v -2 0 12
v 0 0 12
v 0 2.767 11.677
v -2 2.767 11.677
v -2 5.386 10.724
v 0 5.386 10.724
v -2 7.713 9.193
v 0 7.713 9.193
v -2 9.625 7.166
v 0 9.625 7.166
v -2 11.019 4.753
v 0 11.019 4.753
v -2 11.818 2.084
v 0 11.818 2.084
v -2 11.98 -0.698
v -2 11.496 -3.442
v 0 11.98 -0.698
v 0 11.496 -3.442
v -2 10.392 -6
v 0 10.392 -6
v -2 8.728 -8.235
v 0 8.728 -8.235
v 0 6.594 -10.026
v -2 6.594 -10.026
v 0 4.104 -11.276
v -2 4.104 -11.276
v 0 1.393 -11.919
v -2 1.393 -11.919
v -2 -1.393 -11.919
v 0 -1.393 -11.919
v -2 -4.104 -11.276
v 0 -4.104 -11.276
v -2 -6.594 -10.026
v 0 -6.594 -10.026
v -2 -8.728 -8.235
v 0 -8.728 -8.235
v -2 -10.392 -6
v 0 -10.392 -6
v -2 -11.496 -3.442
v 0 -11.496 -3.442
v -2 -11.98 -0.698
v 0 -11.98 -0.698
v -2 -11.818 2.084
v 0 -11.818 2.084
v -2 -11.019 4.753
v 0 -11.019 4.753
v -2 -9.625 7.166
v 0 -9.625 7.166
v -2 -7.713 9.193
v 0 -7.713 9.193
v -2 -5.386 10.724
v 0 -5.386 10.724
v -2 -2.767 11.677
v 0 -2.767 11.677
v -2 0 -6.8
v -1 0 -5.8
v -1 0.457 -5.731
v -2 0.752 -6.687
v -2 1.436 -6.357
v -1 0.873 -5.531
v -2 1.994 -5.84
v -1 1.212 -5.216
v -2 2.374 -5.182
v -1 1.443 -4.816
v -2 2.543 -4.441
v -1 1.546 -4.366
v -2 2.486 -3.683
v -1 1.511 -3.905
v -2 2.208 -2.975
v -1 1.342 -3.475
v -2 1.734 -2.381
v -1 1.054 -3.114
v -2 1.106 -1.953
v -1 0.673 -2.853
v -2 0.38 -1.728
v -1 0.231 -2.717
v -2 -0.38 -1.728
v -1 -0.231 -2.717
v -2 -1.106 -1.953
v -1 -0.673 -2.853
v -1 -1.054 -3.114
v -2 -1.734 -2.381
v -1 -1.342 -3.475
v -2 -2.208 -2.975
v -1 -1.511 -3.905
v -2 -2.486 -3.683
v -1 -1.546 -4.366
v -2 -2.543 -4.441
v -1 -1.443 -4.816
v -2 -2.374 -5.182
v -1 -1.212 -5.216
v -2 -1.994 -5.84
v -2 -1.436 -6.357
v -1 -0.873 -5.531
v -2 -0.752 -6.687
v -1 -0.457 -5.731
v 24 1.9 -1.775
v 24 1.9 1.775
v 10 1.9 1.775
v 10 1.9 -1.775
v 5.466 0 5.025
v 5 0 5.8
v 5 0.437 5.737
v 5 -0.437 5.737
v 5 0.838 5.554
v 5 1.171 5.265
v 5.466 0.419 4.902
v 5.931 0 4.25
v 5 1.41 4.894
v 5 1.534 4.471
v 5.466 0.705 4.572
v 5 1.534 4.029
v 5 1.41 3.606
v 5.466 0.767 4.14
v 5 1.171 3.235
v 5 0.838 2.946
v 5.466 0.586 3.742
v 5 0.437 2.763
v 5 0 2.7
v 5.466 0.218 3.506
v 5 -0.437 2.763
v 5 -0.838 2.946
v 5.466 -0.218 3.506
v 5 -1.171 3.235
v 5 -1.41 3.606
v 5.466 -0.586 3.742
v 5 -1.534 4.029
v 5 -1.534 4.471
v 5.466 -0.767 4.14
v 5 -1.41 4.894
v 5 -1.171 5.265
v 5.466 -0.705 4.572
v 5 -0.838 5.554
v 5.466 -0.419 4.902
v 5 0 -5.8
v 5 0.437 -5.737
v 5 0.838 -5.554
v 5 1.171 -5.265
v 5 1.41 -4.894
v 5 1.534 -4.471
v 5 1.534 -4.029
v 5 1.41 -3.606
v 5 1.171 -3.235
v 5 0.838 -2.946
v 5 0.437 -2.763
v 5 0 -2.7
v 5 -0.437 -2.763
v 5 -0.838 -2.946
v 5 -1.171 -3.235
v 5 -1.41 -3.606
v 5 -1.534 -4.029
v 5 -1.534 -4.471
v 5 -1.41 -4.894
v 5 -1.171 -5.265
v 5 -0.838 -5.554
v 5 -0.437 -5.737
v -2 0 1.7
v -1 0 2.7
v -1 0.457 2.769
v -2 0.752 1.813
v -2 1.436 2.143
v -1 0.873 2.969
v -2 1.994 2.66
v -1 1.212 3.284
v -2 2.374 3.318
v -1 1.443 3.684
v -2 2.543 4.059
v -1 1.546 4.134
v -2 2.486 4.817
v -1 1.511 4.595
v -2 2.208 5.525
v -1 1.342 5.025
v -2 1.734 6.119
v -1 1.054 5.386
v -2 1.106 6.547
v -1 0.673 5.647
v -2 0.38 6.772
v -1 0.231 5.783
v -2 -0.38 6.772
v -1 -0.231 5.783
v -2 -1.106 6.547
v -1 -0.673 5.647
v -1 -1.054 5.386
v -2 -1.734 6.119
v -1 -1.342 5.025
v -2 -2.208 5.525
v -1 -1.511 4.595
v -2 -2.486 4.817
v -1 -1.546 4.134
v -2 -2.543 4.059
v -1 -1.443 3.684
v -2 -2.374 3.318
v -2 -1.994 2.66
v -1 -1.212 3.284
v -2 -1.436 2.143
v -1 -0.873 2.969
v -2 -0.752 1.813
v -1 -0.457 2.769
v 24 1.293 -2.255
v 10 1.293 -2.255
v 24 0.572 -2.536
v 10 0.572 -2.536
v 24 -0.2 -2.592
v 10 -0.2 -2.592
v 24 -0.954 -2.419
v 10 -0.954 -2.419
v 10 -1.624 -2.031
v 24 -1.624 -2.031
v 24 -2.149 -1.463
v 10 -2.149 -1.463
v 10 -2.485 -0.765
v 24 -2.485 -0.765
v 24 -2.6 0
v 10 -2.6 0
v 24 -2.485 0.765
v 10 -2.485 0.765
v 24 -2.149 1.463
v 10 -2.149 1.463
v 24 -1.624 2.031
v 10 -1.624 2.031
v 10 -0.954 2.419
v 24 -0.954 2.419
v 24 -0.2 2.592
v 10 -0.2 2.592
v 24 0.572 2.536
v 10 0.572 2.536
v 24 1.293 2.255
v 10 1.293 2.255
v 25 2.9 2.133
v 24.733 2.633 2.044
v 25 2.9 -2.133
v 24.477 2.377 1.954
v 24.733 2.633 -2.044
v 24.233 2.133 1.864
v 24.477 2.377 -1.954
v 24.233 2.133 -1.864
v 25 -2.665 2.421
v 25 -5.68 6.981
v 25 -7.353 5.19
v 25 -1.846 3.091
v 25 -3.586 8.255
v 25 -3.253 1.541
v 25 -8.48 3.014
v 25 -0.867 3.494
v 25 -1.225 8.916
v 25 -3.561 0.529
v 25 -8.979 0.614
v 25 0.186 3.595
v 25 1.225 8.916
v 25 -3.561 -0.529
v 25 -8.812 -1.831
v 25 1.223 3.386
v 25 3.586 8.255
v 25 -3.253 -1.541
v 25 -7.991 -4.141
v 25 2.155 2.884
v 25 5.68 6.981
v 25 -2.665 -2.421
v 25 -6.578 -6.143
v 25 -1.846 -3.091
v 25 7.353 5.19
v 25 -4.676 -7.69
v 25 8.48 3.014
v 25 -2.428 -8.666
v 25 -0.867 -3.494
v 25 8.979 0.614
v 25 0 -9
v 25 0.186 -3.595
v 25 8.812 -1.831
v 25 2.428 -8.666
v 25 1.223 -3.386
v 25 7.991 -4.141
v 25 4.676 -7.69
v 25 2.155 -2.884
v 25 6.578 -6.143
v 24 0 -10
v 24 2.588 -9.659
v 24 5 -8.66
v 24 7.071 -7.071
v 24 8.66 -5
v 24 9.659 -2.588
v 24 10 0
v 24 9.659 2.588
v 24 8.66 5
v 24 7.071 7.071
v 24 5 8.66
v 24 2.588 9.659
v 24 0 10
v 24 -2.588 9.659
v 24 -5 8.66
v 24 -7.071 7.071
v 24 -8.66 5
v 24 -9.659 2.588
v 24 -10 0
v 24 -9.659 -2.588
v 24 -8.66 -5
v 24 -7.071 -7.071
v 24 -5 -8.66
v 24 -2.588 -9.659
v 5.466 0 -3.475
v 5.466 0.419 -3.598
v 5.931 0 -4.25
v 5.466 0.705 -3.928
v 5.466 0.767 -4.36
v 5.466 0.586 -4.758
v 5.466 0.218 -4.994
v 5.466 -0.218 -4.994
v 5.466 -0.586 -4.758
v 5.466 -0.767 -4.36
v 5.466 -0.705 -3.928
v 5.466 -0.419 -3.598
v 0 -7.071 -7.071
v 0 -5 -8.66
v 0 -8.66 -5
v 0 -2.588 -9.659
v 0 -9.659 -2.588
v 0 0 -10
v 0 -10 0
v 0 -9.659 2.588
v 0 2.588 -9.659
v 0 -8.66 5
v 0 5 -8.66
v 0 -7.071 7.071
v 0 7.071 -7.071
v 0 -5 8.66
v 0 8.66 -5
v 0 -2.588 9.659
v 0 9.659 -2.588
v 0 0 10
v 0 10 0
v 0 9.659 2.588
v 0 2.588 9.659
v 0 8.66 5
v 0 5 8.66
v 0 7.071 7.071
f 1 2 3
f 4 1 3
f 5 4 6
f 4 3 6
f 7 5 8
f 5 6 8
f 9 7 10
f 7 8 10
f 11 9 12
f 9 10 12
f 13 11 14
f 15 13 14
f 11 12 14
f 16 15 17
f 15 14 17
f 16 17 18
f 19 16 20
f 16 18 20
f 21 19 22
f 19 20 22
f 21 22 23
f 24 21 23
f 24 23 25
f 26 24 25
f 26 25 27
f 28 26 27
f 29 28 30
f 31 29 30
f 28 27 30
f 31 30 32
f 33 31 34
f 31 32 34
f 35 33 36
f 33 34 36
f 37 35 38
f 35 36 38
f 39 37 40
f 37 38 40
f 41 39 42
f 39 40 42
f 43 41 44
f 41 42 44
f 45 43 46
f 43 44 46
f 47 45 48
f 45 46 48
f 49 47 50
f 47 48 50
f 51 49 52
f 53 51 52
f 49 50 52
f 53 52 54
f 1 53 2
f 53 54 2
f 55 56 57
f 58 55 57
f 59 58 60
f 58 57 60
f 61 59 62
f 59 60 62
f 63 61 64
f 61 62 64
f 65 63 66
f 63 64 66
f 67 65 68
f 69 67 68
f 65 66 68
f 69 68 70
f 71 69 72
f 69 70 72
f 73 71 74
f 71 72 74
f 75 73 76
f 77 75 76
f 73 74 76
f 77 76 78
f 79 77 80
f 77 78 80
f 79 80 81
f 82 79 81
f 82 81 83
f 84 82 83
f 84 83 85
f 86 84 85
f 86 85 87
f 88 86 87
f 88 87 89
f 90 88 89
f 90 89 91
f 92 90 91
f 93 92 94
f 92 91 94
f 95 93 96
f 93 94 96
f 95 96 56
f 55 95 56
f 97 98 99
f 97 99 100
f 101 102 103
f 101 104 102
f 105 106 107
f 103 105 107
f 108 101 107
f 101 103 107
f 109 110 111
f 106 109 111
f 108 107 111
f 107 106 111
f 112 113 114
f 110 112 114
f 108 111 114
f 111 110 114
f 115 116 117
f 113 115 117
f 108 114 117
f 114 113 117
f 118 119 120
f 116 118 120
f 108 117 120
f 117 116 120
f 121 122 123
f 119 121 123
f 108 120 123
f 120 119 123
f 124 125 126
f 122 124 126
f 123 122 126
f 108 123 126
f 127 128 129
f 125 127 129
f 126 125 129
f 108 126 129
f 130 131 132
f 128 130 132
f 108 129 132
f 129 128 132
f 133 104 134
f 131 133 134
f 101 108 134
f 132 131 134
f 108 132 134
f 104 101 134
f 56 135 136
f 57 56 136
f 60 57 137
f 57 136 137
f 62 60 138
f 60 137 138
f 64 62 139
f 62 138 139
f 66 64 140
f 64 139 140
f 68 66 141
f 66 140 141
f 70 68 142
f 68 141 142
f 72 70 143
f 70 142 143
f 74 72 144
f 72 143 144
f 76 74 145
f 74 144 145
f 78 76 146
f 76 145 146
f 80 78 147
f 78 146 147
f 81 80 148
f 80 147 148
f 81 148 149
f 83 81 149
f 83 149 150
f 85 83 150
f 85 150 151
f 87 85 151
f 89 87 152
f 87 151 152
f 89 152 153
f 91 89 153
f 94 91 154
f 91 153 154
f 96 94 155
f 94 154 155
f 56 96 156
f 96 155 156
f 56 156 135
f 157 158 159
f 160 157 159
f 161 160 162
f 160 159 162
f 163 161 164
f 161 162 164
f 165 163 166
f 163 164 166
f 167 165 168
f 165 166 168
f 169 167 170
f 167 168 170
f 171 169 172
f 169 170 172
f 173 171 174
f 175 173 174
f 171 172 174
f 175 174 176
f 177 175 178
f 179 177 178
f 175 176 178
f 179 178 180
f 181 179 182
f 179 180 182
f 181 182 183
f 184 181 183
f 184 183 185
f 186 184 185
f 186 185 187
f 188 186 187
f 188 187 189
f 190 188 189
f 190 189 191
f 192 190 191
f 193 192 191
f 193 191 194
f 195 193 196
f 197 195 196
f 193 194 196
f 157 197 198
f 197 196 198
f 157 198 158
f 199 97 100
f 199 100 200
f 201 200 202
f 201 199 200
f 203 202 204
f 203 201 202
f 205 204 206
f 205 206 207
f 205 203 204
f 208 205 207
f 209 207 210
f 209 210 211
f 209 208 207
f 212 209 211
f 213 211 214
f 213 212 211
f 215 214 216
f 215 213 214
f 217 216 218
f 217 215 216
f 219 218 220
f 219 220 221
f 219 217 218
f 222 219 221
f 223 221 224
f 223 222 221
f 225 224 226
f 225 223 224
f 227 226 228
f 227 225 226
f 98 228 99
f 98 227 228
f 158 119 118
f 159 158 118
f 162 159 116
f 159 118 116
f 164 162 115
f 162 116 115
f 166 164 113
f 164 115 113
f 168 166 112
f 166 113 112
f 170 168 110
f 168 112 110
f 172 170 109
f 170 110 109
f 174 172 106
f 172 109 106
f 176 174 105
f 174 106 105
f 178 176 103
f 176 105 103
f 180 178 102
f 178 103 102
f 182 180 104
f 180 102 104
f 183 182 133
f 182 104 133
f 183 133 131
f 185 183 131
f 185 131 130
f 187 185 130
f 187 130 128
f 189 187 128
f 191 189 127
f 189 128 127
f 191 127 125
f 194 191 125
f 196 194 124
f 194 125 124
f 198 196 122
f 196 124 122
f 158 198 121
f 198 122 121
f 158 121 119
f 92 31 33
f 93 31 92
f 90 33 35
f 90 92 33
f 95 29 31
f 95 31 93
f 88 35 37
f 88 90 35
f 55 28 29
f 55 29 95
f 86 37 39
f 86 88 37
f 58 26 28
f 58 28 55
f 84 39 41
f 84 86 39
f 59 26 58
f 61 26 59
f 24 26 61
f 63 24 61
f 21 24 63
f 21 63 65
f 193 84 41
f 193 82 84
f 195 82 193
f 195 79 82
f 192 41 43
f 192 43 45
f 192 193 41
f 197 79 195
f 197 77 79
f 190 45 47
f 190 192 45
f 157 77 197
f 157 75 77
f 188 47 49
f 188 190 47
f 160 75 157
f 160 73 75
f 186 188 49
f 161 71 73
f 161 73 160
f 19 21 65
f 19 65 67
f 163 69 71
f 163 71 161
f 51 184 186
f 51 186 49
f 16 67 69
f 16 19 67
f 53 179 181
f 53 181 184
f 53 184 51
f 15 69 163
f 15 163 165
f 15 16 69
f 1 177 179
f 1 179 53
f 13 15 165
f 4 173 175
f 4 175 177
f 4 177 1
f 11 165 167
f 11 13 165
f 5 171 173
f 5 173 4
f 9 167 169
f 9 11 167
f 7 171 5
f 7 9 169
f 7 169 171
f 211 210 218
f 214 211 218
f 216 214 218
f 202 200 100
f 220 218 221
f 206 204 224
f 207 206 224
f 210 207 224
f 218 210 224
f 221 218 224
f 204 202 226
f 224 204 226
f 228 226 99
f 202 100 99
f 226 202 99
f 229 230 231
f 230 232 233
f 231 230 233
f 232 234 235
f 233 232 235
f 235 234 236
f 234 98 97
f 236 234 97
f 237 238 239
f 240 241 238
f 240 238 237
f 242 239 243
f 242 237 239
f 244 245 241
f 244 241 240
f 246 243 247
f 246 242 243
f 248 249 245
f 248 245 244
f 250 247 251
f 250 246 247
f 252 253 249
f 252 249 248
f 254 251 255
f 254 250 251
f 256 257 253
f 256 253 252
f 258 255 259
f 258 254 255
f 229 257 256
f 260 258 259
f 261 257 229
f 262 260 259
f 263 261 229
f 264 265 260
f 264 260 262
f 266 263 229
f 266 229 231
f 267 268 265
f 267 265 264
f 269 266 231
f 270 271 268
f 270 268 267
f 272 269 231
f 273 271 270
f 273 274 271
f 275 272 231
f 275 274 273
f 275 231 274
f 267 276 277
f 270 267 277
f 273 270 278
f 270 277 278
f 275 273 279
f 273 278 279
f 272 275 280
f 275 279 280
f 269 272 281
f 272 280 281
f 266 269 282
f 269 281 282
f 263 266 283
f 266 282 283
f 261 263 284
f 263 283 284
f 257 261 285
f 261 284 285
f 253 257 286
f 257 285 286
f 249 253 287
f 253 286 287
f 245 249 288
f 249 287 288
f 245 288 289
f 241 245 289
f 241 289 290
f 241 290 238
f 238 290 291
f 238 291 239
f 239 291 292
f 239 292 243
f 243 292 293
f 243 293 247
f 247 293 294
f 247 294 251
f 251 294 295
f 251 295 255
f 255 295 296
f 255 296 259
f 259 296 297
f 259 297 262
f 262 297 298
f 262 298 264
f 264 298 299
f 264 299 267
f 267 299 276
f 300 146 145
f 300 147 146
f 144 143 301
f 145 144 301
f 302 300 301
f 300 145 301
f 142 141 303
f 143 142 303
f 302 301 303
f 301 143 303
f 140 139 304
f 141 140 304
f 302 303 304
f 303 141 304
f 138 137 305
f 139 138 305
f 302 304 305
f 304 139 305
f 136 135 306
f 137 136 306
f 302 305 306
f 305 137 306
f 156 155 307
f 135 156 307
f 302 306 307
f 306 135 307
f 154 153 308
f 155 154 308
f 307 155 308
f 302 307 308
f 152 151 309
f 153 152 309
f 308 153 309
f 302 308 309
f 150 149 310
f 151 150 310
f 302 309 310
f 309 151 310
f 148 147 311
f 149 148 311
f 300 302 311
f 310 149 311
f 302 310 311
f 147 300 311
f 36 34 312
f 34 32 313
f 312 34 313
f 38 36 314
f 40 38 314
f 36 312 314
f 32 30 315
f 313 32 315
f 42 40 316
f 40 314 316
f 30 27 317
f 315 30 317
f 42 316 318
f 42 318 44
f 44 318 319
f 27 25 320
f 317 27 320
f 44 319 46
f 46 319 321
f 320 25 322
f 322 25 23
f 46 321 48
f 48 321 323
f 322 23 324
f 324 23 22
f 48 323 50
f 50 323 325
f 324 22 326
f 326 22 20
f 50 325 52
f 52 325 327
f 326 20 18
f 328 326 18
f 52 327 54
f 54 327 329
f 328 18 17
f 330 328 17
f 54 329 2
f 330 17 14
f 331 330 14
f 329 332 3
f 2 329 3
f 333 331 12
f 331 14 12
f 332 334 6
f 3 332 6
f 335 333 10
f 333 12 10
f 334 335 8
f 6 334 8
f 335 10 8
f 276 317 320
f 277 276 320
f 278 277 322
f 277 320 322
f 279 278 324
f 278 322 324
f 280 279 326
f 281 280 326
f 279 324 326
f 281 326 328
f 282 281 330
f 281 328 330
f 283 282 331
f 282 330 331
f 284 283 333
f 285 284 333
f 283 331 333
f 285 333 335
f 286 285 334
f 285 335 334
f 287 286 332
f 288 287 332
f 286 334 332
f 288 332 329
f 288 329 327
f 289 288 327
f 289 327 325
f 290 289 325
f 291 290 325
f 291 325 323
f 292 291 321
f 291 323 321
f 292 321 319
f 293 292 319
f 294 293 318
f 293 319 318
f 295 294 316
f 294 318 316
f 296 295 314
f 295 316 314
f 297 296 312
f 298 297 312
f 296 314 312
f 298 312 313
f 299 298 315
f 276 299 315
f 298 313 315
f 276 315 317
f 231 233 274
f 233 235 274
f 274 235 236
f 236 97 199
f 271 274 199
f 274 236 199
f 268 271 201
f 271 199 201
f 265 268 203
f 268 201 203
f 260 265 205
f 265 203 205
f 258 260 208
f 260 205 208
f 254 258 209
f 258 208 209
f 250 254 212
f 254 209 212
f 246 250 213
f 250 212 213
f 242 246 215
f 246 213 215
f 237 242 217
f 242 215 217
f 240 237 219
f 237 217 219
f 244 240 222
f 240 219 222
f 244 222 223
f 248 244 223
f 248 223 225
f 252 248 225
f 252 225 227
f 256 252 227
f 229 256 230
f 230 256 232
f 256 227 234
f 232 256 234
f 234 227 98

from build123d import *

# Parameters (mm, degrees)
SKIZZE2_R                            = 10
AUFSATZ_LINEAR_AUSTRAGEN1_DEPTH      = 25
SKIZZE3_R                            = 12
AUFSATZ_LINEAR_AUSTRAGEN2_DEPTH      = 2
SCHNITT_LINEAR_AUSTRAGEN1_DEPTH      = 15
FASE1_SIZE                           = 1
FASE2_SIZE                           = 1
F_3_1_3_1_DURCHMESSER_BOHRUNG1_D     = 3.1
F_3_1_3_1_DURCHMESSER_BOHRUNG1_DEPTH = 7
F_3_1_3_1_DURCHMESSER_BOHRUNG1_TIP   = 0.931333959
FASE3_SIZE                           = 1


with BuildPart() as part:
    # Skizze2 → Aufsatz-Linear austragen1 (new body)
    with BuildSketch(Plane(origin=(0, 0, 0), x_dir=(0, 0, -1), z_dir=(1, 0, 0))):
        Circle(SKIZZE2_R)
    extrude(amount=AUFSATZ_LINEAR_AUSTRAGEN1_DEPTH)

    # Skizze3 → Aufsatz-Linear austragen2 (add)
    with BuildSketch(Plane.ZY):
        Circle(SKIZZE3_R)
    extrude(amount=AUFSATZ_LINEAR_AUSTRAGEN2_DEPTH)

    # Skizze4 → Schnitt-Linear austragen1 (cut)
    with BuildSketch(Plane(origin=(25, 0, 0), x_dir=(0, 0, -1), z_dir=(1, 0, 0))):
        with BuildLine():
            Line((-1.774823935, 1.9), (1.774823935, 1.9))
            ThreePointArc((1.774823935, 1.9), (0, -2.6), (-1.774823935, 1.9))
        make_face()
    extrude(amount=-SCHNITT_LINEAR_AUSTRAGEN1_DEPTH, mode=Mode.SUBTRACT)

    # Fase1
    fase1_edges = [part.edges().sort_by_distance(p)[0] for p in [
        (25, -2.6, 0),
        (25, 1.9, 0),
    ]]
    chamfer(fase1_edges, length=FASE1_SIZE)

    # Fase2
    fase2_edges = [part.edges().sort_by_distance(p)[0] for p in [
        (25, 0, 10),
    ]]
    chamfer(fase2_edges, length=FASE2_SIZE)

    # Ø3.1 (3.1) Durchmesser Bohrung1
    with Locations(Plane.ZY.offset(2)):
        with Locations((4.25, 0), (-4.25, 0)):
            Hole(F_3_1_3_1_DURCHMESSER_BOHRUNG1_D / 2, depth=F_3_1_3_1_DURCHMESSER_BOHRUNG1_DEPTH)
            with Locations((0, 0, -(F_3_1_3_1_DURCHMESSER_BOHRUNG1_DEPTH + F_3_1_3_1_DURCHMESSER_BOHRUNG1_TIP / 2))):  # 118° drill point
                Cone(0, F_3_1_3_1_DURCHMESSER_BOHRUNG1_D / 2, F_3_1_3_1_DURCHMESSER_BOHRUNG1_TIP, mode=Mode.SUBTRACT)

    # Fase3
    fase3_edges = [part.edges().sort_by_distance(p)[0] for p in [
        (-2, 0, 5.8),
        (-2, 0, -2.7),
    ]]
    chamfer(fase3_edges, length=FASE3_SIZE)


solid = part.part
